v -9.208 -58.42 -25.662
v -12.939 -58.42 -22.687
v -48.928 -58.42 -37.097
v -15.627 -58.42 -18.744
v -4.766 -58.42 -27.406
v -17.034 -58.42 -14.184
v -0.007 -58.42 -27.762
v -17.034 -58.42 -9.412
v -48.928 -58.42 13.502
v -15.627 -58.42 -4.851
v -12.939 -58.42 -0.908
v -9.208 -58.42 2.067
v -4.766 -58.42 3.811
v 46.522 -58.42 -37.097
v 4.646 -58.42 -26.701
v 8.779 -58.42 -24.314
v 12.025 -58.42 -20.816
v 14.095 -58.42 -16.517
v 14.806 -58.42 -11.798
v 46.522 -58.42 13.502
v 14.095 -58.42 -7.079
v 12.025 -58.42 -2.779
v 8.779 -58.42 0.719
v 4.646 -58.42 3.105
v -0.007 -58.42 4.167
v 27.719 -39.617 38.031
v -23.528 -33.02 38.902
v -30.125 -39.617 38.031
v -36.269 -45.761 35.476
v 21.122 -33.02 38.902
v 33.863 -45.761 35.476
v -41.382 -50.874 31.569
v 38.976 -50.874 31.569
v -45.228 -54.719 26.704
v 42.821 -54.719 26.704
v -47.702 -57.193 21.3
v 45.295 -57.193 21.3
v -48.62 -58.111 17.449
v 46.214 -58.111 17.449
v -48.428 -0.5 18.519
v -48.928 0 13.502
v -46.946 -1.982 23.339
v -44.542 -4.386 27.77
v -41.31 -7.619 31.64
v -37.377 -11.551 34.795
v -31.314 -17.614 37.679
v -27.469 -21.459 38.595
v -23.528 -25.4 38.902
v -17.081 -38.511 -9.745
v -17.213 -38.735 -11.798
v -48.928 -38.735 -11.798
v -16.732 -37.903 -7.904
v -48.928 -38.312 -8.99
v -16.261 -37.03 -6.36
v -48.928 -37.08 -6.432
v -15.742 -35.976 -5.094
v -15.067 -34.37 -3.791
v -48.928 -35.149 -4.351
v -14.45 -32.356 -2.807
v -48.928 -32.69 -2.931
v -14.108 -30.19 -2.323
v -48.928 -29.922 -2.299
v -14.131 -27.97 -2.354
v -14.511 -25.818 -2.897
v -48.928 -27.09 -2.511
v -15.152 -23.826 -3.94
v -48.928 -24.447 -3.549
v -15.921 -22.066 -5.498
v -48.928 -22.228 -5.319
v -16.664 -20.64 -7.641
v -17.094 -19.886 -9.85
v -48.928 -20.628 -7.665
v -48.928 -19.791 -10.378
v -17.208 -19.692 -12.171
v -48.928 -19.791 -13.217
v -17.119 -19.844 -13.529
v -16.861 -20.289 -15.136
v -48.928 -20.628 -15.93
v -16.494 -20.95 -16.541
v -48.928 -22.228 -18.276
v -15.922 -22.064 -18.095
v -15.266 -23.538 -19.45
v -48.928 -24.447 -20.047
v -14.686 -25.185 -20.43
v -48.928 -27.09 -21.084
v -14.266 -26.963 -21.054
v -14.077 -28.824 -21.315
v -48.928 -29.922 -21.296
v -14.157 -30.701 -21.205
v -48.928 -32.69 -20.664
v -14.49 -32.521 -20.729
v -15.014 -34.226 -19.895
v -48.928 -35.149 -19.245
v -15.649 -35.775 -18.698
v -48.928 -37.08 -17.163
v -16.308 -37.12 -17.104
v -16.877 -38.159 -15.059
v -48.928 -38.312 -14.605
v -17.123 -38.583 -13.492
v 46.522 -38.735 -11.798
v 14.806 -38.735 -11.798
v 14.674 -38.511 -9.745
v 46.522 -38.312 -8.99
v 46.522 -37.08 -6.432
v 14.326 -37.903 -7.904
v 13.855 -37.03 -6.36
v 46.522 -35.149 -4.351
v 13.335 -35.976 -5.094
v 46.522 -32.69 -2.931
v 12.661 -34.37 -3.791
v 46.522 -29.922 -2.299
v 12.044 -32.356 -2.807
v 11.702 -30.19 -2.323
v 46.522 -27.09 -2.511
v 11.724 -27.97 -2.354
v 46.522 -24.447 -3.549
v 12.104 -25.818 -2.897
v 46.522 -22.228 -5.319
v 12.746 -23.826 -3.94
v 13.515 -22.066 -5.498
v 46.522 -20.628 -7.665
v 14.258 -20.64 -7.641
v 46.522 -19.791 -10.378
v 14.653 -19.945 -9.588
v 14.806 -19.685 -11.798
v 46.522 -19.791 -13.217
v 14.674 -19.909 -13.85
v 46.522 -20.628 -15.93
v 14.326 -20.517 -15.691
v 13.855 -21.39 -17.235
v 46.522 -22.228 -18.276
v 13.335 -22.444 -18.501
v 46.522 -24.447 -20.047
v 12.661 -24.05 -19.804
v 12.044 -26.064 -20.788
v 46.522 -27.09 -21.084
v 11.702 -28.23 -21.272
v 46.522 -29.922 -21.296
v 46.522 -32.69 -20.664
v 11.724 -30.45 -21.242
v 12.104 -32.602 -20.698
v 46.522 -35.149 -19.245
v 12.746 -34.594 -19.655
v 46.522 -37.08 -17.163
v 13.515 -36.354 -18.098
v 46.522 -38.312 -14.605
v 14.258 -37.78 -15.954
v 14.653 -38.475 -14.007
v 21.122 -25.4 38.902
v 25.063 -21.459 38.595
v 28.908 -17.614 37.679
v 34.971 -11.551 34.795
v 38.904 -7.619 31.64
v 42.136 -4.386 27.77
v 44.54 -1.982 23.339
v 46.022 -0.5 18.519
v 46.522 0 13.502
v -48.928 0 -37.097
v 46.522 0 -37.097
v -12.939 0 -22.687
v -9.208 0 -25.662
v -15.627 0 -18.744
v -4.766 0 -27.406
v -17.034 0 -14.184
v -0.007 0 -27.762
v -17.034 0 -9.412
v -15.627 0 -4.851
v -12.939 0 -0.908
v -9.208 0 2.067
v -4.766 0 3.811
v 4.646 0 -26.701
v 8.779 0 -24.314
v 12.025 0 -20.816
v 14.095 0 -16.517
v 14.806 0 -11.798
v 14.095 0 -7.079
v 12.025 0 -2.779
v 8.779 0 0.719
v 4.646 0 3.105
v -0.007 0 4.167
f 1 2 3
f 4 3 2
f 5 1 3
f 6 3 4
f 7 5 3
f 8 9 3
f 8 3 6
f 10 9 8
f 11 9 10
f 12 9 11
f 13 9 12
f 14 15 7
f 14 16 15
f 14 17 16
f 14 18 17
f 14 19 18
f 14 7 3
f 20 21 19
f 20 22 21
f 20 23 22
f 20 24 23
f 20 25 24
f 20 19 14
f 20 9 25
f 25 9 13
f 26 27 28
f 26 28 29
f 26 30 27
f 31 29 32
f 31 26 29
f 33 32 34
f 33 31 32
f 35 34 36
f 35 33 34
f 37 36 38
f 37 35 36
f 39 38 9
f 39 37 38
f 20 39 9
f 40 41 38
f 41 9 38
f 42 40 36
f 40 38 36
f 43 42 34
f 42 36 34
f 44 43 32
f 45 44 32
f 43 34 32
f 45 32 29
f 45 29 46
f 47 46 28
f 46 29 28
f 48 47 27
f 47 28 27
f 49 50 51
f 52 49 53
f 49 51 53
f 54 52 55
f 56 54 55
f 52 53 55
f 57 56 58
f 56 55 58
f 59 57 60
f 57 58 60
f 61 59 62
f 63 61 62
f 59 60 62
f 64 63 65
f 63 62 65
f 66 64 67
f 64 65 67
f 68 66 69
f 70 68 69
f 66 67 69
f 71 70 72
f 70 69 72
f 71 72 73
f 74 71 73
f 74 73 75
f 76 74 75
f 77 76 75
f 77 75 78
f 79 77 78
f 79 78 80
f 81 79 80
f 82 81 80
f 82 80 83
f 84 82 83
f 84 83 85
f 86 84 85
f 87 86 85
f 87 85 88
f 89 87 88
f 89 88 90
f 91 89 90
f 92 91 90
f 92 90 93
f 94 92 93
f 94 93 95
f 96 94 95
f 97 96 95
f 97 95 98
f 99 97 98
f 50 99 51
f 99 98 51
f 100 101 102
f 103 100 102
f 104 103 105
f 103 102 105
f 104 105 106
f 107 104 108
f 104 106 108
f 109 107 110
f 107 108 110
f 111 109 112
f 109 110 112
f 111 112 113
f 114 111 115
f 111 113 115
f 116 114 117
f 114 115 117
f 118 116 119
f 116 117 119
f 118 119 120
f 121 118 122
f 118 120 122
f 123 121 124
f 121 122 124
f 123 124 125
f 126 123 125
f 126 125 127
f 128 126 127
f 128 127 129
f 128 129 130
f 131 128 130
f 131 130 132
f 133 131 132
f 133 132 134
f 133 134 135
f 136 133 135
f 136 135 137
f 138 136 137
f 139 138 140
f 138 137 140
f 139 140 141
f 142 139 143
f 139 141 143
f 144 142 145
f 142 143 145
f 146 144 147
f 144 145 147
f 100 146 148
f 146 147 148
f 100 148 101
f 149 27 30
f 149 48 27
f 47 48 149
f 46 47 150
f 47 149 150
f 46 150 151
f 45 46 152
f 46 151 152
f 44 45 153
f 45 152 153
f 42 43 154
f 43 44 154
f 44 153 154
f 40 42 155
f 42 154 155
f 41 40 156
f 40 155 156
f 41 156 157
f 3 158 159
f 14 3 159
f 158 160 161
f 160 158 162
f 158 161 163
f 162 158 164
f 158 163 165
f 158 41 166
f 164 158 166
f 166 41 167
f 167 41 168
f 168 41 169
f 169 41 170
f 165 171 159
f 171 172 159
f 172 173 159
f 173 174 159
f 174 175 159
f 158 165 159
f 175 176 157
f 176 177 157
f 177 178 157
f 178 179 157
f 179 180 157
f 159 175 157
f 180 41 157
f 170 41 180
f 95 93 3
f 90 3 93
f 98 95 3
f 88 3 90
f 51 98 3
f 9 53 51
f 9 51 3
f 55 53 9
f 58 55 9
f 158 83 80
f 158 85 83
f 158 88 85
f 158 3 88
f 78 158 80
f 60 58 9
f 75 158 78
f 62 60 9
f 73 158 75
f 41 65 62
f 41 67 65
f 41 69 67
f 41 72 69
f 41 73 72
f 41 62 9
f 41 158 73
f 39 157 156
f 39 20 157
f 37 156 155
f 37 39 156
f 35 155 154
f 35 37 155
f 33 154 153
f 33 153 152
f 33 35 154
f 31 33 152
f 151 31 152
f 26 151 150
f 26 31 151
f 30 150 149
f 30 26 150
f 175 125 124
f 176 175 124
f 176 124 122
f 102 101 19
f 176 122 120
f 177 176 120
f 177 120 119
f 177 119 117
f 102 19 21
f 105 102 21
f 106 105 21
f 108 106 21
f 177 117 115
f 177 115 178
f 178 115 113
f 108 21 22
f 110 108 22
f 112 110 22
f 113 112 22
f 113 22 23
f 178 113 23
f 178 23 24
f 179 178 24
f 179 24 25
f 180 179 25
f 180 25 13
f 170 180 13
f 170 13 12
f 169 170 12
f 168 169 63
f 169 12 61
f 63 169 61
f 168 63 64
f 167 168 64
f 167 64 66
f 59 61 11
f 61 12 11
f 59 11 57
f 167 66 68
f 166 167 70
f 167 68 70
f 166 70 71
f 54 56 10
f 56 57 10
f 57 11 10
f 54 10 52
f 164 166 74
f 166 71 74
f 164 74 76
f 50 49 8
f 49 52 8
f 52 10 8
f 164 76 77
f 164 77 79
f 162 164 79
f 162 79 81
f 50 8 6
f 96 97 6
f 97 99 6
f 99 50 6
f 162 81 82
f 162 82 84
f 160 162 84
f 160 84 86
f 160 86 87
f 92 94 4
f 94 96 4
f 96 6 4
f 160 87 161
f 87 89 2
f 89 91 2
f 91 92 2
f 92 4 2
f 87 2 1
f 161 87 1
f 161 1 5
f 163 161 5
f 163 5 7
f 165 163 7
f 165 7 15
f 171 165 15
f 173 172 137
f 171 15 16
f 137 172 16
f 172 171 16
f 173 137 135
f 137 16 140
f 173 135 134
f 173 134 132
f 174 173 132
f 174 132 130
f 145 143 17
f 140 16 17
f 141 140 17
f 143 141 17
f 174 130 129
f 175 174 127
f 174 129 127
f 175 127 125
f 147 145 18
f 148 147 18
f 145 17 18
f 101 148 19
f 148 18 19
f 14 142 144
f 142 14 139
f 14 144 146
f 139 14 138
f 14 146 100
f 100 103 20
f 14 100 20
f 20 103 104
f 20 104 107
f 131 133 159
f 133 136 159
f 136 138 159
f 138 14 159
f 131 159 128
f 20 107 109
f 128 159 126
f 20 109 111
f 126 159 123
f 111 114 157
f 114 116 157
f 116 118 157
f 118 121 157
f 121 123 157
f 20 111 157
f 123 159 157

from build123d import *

# Parameters (mm, degrees)
F0_W     = 95.450528
F0_H     = 75.999472
F1_DEPTH = 58.42
F2_R     = 25.4
F3_R     = 16.009617
F4_DEPTH = 58.421
F6_D     = 19.05


with BuildPart() as f1:
    # F0 (on Front) → F1 (new body)
    with BuildSketch(Plane.XZ):
        with Locations((-1.203157, 0.902368)):
            Rectangle(F0_W, F0_H)
    extrude(amount=F1_DEPTH)

    # F2
    f2_edges = [f1.edges().sort_by_distance(p)[0] for p in [
        (-1.203157, -58.42, 38.902104),
        (46.522107, -29.21, 38.902104),
        (-48.928421, -29.21, 38.902104),
        (-1.203157, 0, 38.902104),
    ]]
    fillet(f2_edges, radius=F2_R)

    # F3 (on face) → F4 (cut, through all)
    with BuildSketch(Plane.XZ.offset(58.42)):
        with Locations((-1.203157, -11.797632)):
            Circle(F3_R)
    extrude(amount=-F4_DEPTH, mode=Mode.SUBTRACT)

    # F6 (through all)
    with Locations(Plane.YZ.offset(46.522107)):
        with Locations((-29.21, -11.797632)):
            Hole(F6_D / 2)


solid = f1.part
